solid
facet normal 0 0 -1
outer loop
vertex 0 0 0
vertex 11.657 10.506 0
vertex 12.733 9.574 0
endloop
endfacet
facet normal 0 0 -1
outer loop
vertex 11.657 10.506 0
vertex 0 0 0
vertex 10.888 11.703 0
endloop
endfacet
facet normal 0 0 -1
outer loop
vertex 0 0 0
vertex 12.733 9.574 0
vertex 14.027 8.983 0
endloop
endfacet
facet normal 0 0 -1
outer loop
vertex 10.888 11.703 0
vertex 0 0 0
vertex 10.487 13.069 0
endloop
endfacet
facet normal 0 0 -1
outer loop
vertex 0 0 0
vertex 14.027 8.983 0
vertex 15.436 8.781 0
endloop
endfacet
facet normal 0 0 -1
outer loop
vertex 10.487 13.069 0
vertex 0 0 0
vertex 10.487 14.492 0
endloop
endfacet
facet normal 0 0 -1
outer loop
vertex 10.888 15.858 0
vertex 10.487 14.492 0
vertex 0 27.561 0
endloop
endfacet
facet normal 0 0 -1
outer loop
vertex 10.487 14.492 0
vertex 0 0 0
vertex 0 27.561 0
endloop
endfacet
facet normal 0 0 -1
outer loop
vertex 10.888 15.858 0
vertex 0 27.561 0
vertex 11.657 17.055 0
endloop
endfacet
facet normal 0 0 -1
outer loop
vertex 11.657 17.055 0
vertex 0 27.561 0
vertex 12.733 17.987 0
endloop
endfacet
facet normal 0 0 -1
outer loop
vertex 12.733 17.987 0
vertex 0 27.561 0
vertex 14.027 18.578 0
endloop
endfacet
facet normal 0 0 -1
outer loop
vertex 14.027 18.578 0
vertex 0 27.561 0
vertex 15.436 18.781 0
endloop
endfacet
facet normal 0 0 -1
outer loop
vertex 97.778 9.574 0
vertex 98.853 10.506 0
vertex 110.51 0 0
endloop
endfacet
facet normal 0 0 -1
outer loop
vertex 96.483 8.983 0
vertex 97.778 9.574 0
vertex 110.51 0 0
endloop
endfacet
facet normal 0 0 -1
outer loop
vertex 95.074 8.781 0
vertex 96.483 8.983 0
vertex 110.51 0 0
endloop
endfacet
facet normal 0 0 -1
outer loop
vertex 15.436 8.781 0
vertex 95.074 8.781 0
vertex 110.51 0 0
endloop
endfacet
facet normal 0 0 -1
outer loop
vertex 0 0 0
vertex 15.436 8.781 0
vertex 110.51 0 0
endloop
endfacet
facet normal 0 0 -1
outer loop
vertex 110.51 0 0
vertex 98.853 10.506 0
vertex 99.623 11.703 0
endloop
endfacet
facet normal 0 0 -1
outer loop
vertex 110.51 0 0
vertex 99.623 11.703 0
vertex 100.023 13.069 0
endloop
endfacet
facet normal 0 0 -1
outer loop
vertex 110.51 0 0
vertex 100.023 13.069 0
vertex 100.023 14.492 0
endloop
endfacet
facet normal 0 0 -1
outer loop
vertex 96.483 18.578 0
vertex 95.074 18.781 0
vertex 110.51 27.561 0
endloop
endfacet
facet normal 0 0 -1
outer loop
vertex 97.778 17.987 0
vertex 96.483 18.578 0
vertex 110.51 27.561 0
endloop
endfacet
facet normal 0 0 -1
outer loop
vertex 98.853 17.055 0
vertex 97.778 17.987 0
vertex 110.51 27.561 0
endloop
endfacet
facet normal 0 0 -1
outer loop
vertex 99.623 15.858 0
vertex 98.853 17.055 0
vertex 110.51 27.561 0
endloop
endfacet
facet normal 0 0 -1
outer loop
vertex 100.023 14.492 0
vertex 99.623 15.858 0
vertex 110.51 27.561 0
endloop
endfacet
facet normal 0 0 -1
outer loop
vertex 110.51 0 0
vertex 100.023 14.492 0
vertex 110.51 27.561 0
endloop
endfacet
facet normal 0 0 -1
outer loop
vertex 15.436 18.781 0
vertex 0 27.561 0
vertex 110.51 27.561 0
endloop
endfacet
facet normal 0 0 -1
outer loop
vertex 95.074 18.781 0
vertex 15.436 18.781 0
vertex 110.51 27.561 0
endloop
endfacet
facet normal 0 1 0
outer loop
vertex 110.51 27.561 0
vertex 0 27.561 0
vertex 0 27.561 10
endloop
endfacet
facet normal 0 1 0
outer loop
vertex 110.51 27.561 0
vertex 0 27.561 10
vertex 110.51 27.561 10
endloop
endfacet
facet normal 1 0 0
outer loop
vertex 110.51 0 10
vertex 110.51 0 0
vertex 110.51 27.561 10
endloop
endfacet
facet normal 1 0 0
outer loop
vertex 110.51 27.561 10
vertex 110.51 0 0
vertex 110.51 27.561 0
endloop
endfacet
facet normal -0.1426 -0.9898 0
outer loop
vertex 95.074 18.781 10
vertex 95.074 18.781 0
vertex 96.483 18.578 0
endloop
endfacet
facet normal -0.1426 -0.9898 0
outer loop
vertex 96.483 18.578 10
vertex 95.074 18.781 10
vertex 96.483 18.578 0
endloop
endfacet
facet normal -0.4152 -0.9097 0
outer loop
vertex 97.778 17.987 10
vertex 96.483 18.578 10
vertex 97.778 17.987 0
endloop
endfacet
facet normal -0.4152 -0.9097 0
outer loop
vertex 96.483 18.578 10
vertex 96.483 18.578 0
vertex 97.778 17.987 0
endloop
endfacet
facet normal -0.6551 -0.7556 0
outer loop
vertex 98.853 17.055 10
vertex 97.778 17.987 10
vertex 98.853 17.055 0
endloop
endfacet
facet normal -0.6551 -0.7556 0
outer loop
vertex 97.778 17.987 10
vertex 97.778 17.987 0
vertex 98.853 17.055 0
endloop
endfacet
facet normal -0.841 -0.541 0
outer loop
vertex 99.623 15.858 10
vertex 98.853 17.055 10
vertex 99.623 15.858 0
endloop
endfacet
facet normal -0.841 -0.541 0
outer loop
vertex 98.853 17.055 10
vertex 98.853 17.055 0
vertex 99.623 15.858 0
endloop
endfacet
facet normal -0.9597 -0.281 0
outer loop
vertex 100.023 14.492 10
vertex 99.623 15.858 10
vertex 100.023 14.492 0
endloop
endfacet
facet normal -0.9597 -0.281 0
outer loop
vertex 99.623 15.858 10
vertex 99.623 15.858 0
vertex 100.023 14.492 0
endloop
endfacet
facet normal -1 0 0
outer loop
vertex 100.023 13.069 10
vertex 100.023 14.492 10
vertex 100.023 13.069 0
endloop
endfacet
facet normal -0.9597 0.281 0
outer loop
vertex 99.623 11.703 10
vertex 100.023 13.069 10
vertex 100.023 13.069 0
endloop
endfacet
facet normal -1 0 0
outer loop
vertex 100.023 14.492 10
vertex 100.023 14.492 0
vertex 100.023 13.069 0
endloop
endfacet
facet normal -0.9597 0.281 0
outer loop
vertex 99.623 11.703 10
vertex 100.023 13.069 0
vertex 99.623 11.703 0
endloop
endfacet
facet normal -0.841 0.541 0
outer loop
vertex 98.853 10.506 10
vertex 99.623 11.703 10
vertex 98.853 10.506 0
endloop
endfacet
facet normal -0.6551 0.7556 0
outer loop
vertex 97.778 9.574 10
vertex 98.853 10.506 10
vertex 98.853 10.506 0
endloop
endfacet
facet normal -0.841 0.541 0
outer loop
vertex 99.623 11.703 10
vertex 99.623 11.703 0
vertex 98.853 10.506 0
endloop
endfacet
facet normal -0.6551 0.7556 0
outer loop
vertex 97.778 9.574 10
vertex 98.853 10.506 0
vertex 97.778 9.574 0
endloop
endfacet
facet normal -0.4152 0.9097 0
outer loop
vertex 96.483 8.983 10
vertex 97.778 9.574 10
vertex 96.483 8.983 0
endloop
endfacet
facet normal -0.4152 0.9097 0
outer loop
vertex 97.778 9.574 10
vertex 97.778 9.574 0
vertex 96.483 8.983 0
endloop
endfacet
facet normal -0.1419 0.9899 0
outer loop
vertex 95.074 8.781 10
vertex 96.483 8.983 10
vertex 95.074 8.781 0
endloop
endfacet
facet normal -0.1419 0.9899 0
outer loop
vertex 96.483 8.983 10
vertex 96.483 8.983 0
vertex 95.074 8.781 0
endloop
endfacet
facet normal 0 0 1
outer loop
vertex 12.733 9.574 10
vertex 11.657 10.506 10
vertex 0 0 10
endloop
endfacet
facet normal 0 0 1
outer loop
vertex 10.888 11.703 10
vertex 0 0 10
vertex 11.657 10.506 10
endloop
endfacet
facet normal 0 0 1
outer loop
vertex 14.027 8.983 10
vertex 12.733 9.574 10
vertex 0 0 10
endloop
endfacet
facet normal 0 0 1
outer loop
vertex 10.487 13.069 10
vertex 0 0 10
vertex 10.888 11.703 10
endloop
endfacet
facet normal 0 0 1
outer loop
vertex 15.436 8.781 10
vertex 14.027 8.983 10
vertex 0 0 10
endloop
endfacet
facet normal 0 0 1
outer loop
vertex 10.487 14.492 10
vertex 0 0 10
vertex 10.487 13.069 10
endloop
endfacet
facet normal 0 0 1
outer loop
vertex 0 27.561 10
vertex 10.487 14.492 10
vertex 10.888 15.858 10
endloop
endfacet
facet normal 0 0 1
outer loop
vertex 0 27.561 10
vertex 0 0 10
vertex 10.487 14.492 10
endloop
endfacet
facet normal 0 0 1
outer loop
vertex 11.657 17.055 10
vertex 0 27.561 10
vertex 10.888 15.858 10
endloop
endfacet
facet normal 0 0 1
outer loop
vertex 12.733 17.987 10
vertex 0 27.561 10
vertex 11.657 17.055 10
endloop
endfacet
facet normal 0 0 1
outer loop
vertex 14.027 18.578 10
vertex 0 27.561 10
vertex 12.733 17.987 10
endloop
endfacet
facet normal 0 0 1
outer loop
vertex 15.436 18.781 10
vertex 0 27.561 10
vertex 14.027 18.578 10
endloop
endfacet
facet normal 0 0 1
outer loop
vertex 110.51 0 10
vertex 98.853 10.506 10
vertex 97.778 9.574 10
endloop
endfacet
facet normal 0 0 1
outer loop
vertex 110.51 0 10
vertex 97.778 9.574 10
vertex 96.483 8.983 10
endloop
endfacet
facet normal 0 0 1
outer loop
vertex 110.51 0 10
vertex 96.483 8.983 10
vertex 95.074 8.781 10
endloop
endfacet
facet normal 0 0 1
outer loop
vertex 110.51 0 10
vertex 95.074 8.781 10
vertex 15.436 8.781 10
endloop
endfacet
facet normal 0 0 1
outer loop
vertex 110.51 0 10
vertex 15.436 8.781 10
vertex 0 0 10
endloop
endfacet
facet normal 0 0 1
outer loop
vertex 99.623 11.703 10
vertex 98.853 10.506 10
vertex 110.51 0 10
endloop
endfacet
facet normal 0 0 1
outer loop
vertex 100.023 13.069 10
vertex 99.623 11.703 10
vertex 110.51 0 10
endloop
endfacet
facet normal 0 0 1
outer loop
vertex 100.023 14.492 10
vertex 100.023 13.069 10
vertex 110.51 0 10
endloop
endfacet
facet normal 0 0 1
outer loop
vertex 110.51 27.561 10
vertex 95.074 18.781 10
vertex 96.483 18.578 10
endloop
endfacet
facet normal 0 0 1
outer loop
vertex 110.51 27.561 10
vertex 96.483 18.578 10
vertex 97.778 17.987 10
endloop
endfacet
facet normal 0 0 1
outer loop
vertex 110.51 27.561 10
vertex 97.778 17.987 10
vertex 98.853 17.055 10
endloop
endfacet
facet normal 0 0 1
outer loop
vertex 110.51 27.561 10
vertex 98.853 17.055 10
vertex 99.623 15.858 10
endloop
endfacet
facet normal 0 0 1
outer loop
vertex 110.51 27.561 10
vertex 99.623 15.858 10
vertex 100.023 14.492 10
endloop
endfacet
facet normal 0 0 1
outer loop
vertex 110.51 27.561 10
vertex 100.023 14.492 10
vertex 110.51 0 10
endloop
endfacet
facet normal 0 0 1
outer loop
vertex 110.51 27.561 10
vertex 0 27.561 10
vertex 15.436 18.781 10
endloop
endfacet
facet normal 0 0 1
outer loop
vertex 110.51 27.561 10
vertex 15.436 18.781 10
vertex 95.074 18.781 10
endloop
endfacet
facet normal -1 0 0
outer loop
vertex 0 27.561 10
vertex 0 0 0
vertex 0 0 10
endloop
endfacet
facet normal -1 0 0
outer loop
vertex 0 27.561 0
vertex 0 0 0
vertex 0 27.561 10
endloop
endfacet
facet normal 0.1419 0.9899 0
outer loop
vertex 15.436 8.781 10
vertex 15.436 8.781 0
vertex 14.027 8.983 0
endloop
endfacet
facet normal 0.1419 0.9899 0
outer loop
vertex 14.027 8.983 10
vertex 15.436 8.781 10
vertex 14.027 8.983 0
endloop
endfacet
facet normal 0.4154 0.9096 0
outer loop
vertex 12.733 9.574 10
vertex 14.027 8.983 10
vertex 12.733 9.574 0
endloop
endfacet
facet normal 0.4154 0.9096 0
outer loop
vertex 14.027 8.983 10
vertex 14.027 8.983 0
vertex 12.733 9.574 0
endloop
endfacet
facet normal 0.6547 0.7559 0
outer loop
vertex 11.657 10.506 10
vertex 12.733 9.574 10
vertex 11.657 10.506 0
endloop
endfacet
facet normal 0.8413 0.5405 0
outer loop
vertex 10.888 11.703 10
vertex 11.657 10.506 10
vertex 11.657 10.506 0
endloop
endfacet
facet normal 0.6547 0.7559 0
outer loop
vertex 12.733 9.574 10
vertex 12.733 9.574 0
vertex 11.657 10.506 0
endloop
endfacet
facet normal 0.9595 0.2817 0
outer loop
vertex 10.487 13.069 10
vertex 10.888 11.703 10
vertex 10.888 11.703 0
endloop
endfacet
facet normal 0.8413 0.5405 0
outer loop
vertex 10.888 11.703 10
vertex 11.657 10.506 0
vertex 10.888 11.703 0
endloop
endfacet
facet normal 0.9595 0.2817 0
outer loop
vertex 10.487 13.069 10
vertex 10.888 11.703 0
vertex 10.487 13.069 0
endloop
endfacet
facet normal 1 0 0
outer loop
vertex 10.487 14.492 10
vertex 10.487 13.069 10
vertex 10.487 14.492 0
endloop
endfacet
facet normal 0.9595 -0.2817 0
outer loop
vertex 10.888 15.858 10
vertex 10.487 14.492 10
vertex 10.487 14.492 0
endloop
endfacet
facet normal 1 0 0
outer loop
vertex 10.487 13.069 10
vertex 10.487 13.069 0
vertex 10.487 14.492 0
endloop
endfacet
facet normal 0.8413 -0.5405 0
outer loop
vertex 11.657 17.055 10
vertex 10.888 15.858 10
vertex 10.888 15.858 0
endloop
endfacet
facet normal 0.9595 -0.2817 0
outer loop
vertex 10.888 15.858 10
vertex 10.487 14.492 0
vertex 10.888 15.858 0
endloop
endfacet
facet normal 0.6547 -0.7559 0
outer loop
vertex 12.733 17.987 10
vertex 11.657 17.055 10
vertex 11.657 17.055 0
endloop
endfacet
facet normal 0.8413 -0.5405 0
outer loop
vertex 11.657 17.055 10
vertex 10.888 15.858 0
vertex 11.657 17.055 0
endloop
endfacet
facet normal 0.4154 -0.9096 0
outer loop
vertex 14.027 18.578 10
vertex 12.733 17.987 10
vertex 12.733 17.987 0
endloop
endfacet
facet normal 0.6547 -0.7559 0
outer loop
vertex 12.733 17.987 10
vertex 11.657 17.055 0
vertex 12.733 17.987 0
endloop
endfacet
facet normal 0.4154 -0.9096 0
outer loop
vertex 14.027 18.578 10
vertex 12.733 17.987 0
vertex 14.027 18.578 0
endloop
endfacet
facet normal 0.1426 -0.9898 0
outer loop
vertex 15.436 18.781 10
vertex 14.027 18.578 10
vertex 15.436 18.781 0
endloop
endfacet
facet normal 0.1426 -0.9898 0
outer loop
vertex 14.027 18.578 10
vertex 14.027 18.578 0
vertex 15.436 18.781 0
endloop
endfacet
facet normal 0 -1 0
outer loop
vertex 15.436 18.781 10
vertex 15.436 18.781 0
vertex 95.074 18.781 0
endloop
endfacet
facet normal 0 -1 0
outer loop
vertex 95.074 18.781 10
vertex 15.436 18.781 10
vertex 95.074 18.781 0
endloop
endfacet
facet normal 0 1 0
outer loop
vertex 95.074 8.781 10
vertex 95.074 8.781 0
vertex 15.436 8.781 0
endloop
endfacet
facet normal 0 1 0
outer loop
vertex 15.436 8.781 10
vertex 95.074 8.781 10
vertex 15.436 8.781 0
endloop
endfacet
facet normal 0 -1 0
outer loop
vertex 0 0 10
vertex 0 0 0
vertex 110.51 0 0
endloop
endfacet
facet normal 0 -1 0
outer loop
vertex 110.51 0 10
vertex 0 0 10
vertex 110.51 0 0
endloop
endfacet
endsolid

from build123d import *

# Parameters (mm, degrees)
SKETCH1_W           = 110.510118672
SKETCH1_H           = 27.56100364
BOSS_EXTRUDE1_DEPTH = 10


with BuildPart() as part:
    # Sketch1 → Boss-Extrude1 (new body)
    with BuildSketch(Plane.XY):
        with Locations((55.255059336, 13.78050182)):
            Rectangle(SKETCH1_W, SKETCH1_H)
        with BuildLine():
            Line((15.435752348, 18.78050182), (95.074366324, 18.78050182))
            ThreePointArc((95.074366324, 18.78050182), (100.074366324, 13.78050182), (95.074366324, 8.78050182))
            Line((95.074366324, 8.78050182), (15.435752348, 8.78050182))
            ThreePointArc((15.435752348, 8.78050182), (10.435752348, 13.78050182), (15.435752348, 18.78050182))
        make_face(mode=Mode.SUBTRACT)
    extrude(amount=BOSS_EXTRUDE1_DEPTH)


solid = part.part
